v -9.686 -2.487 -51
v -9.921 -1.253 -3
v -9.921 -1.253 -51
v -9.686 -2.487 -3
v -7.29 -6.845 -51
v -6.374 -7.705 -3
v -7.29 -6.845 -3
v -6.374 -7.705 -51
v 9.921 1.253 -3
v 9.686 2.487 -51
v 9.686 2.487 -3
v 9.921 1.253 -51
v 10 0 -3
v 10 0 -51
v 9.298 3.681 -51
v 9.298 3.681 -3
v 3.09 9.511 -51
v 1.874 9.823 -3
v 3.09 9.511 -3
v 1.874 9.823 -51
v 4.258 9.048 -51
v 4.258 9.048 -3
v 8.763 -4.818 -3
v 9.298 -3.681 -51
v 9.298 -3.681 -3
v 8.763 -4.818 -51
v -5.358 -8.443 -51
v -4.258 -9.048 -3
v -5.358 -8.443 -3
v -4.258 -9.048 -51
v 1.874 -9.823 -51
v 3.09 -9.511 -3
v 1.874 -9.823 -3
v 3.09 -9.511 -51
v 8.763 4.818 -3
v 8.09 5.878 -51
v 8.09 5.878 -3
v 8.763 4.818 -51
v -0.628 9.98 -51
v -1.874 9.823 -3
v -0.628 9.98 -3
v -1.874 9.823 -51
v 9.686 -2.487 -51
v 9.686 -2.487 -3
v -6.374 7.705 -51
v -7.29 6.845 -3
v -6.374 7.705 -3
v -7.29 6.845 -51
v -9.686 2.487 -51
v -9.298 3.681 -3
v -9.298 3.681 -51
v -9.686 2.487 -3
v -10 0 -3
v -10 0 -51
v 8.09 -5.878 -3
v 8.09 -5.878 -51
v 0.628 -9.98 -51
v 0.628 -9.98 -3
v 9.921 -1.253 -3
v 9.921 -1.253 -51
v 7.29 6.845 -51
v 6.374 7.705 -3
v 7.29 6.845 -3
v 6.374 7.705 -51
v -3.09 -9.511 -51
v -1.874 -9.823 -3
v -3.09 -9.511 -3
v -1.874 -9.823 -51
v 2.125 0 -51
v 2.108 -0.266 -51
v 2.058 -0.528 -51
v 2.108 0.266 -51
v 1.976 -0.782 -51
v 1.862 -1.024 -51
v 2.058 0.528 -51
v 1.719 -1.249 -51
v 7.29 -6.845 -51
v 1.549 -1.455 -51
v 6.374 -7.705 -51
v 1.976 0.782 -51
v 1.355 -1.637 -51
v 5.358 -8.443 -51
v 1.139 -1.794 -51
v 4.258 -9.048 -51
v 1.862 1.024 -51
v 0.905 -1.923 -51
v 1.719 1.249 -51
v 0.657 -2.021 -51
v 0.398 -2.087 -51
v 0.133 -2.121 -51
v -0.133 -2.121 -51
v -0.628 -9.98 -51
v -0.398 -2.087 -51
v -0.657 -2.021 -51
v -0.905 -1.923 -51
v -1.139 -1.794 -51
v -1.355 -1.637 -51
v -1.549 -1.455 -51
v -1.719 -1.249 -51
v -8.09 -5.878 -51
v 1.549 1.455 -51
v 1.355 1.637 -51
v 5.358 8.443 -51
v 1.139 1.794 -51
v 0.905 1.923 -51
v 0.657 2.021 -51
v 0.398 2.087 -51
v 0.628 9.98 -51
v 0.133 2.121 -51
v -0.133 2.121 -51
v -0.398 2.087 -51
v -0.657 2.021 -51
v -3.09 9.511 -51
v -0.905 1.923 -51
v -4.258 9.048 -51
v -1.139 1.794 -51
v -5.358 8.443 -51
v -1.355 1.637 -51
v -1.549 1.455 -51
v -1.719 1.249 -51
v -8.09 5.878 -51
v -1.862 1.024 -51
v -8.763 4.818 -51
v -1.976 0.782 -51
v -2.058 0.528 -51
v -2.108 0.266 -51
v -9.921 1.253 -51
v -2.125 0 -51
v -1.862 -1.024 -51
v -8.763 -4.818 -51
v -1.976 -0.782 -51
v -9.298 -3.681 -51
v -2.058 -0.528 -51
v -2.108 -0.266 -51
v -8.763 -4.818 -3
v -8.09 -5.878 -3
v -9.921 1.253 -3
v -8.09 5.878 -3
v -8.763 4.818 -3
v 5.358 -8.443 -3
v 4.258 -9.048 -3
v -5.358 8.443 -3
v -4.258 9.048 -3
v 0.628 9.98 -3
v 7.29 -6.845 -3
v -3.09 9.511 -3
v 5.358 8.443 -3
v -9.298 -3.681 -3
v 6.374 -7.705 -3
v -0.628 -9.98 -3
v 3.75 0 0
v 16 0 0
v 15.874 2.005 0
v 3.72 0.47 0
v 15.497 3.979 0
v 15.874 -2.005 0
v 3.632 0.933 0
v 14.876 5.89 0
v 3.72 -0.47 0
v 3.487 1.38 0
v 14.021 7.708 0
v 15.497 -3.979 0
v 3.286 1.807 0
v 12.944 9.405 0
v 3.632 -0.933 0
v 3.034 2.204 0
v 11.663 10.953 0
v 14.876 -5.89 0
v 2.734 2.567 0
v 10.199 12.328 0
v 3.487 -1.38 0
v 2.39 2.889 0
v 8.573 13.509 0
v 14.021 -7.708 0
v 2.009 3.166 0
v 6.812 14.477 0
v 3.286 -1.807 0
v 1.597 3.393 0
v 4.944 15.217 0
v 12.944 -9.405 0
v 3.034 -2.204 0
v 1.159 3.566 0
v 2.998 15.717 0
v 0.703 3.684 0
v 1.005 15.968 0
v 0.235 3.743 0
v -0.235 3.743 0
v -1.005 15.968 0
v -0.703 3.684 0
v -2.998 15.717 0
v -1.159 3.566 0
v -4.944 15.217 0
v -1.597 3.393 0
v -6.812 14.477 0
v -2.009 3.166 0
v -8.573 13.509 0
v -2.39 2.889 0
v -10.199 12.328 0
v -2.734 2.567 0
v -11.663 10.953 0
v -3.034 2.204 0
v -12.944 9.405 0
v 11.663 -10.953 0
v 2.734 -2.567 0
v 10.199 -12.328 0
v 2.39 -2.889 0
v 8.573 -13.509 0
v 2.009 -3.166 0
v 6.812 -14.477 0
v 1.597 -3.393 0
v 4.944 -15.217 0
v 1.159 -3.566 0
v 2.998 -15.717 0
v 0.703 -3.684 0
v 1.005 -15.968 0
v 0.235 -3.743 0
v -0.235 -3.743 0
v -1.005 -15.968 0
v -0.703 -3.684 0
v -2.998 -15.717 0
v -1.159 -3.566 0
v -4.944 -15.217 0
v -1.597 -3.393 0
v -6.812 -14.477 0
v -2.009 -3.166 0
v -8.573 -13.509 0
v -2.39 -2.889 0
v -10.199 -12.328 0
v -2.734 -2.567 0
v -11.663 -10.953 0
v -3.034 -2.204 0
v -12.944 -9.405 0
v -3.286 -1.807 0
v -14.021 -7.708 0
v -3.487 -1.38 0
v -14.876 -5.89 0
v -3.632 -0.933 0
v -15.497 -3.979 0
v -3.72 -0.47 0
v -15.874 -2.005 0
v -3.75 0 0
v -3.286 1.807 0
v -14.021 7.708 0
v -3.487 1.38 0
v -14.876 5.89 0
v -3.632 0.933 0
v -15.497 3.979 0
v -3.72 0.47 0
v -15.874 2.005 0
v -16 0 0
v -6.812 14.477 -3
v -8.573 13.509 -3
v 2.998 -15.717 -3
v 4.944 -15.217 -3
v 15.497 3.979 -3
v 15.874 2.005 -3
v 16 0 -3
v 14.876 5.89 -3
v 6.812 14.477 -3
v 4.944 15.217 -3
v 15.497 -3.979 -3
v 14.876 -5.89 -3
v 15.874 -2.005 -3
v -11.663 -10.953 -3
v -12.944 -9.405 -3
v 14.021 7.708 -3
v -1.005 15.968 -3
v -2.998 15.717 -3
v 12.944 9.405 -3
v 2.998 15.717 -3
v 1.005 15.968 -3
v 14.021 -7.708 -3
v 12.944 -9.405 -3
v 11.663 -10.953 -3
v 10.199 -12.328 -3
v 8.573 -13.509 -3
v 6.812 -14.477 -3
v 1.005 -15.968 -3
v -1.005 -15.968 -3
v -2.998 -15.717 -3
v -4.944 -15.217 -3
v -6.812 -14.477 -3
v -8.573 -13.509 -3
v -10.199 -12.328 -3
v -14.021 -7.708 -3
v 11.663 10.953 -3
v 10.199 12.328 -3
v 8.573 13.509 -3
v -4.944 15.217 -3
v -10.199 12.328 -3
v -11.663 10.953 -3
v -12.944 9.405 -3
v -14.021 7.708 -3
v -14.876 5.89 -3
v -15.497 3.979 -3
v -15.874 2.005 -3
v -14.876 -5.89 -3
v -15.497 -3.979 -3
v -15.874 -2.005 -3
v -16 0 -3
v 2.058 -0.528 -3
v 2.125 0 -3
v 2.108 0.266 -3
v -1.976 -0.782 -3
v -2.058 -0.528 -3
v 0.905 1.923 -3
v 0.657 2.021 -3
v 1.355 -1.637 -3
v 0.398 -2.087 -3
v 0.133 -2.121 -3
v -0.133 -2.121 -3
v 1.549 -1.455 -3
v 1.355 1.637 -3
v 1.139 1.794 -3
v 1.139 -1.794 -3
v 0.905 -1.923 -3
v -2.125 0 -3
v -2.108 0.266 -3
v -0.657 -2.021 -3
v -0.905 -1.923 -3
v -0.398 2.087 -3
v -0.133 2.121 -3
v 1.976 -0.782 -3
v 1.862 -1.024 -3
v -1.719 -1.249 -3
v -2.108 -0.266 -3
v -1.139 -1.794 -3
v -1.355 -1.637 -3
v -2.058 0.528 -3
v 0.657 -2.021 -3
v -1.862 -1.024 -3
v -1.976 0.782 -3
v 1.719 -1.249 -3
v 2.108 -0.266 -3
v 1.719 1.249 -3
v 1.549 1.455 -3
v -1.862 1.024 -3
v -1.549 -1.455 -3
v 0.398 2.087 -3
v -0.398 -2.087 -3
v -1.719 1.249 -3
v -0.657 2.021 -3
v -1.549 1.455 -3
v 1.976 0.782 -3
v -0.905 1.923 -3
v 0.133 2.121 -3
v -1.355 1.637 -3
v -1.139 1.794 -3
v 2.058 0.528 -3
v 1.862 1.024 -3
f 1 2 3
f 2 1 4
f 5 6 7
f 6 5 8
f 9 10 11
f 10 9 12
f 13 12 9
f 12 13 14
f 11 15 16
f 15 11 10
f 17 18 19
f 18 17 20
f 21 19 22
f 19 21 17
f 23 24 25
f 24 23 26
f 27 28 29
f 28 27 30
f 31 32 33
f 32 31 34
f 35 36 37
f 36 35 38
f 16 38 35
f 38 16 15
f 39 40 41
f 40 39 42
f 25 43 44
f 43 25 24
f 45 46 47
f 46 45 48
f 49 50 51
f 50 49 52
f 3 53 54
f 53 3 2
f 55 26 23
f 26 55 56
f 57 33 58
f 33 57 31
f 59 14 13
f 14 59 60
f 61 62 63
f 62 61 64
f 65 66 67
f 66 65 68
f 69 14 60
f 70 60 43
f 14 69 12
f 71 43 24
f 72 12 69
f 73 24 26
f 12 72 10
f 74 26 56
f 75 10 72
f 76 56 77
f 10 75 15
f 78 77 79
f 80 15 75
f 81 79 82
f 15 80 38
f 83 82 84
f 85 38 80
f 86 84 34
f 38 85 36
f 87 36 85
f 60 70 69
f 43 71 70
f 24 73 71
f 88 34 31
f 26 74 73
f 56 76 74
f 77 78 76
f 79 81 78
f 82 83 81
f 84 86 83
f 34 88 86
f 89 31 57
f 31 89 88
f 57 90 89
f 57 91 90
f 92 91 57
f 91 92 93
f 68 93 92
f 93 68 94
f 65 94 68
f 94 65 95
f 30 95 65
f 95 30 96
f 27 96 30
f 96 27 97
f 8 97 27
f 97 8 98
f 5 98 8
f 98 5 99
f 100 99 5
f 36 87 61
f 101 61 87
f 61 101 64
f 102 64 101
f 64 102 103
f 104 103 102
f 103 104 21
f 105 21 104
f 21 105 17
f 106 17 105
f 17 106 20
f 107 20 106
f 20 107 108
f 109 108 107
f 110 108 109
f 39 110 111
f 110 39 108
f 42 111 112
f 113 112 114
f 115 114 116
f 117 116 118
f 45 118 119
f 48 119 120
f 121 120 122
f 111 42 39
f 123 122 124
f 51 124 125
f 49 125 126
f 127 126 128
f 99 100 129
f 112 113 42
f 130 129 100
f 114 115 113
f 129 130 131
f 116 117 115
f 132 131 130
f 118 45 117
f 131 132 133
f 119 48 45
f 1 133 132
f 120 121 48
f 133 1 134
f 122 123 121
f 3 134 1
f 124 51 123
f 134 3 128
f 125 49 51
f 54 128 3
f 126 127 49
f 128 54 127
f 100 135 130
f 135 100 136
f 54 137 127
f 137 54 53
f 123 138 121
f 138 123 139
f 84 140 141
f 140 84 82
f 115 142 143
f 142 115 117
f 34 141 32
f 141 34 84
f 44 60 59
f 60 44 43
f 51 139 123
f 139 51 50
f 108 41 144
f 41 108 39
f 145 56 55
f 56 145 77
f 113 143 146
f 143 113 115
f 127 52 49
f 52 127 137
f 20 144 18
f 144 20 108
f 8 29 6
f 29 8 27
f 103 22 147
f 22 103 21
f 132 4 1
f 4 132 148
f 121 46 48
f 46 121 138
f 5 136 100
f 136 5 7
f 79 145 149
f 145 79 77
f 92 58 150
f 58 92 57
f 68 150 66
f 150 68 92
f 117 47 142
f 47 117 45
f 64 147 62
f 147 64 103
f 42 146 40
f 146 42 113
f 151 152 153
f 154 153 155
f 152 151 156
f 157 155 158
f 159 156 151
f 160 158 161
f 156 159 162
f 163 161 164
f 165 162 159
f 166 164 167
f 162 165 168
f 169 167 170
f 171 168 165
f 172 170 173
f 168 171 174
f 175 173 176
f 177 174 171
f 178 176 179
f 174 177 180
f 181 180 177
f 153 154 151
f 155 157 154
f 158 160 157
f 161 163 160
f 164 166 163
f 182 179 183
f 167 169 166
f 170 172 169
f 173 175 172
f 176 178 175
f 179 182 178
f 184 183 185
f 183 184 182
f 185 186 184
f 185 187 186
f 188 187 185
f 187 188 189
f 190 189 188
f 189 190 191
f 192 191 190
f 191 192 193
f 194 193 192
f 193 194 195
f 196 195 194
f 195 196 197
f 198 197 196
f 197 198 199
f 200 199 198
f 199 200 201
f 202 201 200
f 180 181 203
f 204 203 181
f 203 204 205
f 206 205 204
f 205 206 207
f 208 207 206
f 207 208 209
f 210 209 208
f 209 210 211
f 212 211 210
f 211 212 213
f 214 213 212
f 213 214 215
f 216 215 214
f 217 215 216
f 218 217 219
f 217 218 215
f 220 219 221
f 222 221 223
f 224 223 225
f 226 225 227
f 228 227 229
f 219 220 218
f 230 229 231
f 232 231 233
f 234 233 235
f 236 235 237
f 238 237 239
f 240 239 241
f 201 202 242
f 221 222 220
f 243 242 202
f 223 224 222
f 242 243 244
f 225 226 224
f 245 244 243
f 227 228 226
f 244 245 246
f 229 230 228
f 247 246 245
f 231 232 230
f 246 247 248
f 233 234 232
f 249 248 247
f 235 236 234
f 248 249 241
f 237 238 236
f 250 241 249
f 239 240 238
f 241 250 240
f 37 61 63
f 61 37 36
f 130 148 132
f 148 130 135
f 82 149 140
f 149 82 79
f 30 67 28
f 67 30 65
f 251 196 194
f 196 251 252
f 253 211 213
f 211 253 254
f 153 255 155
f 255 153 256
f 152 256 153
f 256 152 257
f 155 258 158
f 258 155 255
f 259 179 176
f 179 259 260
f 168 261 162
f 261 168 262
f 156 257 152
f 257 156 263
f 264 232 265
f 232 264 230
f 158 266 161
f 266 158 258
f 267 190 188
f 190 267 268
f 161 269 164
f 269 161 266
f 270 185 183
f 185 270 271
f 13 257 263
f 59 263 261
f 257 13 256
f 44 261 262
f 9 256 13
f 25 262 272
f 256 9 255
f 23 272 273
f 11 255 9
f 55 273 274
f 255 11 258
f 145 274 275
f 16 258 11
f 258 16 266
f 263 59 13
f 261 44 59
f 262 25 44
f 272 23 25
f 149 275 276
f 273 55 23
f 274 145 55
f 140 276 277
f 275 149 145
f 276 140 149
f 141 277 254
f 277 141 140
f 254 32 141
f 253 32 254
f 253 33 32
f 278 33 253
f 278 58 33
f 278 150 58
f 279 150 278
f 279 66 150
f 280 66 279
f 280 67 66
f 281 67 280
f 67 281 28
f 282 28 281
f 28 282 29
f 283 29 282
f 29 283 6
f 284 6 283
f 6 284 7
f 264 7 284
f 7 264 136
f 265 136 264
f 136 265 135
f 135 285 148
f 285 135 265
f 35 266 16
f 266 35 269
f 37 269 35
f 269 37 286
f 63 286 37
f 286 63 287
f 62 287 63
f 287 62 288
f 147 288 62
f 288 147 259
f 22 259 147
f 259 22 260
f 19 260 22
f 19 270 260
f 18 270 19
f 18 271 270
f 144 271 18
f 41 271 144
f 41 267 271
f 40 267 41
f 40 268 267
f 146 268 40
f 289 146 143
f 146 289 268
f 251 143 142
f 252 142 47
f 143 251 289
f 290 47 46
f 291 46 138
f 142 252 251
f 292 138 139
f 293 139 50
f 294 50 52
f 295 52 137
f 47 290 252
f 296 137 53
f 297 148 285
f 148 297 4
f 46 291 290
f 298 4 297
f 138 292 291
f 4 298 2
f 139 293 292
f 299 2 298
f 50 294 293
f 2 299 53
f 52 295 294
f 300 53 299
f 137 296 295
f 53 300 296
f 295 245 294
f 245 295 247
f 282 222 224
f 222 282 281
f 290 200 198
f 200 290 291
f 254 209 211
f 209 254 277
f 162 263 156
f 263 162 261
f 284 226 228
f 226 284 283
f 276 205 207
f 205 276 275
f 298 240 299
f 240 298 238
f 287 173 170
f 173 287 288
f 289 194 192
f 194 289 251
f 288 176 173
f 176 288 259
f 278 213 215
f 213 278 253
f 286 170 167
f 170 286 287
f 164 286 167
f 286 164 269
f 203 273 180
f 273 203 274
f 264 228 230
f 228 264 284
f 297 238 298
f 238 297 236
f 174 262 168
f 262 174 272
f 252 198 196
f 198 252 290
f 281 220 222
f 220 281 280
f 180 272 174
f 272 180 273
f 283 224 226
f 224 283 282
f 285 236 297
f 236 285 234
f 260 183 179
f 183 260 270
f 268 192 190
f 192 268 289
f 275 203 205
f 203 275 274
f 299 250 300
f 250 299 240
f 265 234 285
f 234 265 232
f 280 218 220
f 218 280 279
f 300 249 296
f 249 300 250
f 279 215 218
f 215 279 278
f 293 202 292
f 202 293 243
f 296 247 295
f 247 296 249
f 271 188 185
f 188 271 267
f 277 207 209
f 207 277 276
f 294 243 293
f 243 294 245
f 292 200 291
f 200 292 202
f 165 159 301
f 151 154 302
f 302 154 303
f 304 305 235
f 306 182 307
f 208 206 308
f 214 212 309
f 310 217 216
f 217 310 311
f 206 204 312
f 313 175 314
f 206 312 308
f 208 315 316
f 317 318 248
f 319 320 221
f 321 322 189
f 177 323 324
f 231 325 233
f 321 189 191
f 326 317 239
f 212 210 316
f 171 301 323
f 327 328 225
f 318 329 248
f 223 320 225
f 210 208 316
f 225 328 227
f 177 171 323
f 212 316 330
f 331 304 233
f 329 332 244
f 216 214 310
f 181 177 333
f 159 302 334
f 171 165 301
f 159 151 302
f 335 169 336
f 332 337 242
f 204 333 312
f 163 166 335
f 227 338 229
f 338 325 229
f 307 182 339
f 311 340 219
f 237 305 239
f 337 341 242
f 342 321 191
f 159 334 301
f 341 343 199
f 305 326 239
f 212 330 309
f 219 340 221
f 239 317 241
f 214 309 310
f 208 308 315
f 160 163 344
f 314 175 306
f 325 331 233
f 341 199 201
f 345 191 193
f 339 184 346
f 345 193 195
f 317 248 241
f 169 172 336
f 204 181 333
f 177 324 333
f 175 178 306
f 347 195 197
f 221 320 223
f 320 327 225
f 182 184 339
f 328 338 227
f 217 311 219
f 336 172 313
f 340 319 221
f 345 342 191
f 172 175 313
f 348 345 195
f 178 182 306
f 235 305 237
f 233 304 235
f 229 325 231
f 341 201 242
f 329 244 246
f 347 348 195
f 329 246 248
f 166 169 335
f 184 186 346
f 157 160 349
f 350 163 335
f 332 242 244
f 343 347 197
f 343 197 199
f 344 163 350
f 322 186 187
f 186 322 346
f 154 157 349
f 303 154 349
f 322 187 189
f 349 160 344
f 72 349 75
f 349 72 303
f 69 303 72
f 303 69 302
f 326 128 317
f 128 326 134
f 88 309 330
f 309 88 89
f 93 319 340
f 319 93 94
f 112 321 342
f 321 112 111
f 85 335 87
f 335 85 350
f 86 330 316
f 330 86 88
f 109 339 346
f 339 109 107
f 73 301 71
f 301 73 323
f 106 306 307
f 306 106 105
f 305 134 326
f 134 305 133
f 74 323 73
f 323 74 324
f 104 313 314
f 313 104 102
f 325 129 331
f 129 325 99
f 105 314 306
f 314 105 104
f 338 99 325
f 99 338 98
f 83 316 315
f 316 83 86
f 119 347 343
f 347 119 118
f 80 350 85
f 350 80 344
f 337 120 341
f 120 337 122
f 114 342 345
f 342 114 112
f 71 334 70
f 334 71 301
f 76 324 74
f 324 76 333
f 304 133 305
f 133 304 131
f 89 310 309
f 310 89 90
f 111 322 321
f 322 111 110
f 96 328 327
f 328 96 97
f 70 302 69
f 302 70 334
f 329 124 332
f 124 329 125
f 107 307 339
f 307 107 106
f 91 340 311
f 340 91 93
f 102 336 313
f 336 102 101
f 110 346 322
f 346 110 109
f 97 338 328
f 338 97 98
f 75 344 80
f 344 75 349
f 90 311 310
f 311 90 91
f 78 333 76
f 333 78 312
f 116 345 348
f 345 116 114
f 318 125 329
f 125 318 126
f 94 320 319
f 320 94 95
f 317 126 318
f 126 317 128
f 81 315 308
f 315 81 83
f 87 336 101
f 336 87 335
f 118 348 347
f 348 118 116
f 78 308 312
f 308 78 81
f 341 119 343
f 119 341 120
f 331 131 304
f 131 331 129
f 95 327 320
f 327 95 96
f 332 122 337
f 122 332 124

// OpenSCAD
$fn = 50;


difference() {
	union() {
		translate(v = [0, 0, -51.0000000000]) {
			cylinder(h = 51, r = 10.0000000000);
		}
		translate(v = [0, 0, -3.0000000000]) {
			cylinder(h = 3, r = 16.0000000000);
		}
	}
	union() {
		translate(v = [0, 0, 0]) {
			rotate(a = [0, 0, 0]) {
				difference() {
					union() {
						#translate(v = [0, 0, -51.0000000000]) {
							cylinder(h = 51, r = 2.0000000000);
						}
						#translate(v = [0, 0, -3]) {
							cylinder(h = 3, r = 10.0000000000, r1 = 2.1250000000, r2 = 3.7500000000);
						}
						#translate(v = [0, 0, -51.0000000000]) {
							cylinder(h = 51, r = 2.1250000000);
						}
						#translate(v = [0, 0, -51.0000000000]) {
							cylinder(h = 51, r = 2.0000000000);
						}
					}
					union();
				}
			}
		}
	}
}
